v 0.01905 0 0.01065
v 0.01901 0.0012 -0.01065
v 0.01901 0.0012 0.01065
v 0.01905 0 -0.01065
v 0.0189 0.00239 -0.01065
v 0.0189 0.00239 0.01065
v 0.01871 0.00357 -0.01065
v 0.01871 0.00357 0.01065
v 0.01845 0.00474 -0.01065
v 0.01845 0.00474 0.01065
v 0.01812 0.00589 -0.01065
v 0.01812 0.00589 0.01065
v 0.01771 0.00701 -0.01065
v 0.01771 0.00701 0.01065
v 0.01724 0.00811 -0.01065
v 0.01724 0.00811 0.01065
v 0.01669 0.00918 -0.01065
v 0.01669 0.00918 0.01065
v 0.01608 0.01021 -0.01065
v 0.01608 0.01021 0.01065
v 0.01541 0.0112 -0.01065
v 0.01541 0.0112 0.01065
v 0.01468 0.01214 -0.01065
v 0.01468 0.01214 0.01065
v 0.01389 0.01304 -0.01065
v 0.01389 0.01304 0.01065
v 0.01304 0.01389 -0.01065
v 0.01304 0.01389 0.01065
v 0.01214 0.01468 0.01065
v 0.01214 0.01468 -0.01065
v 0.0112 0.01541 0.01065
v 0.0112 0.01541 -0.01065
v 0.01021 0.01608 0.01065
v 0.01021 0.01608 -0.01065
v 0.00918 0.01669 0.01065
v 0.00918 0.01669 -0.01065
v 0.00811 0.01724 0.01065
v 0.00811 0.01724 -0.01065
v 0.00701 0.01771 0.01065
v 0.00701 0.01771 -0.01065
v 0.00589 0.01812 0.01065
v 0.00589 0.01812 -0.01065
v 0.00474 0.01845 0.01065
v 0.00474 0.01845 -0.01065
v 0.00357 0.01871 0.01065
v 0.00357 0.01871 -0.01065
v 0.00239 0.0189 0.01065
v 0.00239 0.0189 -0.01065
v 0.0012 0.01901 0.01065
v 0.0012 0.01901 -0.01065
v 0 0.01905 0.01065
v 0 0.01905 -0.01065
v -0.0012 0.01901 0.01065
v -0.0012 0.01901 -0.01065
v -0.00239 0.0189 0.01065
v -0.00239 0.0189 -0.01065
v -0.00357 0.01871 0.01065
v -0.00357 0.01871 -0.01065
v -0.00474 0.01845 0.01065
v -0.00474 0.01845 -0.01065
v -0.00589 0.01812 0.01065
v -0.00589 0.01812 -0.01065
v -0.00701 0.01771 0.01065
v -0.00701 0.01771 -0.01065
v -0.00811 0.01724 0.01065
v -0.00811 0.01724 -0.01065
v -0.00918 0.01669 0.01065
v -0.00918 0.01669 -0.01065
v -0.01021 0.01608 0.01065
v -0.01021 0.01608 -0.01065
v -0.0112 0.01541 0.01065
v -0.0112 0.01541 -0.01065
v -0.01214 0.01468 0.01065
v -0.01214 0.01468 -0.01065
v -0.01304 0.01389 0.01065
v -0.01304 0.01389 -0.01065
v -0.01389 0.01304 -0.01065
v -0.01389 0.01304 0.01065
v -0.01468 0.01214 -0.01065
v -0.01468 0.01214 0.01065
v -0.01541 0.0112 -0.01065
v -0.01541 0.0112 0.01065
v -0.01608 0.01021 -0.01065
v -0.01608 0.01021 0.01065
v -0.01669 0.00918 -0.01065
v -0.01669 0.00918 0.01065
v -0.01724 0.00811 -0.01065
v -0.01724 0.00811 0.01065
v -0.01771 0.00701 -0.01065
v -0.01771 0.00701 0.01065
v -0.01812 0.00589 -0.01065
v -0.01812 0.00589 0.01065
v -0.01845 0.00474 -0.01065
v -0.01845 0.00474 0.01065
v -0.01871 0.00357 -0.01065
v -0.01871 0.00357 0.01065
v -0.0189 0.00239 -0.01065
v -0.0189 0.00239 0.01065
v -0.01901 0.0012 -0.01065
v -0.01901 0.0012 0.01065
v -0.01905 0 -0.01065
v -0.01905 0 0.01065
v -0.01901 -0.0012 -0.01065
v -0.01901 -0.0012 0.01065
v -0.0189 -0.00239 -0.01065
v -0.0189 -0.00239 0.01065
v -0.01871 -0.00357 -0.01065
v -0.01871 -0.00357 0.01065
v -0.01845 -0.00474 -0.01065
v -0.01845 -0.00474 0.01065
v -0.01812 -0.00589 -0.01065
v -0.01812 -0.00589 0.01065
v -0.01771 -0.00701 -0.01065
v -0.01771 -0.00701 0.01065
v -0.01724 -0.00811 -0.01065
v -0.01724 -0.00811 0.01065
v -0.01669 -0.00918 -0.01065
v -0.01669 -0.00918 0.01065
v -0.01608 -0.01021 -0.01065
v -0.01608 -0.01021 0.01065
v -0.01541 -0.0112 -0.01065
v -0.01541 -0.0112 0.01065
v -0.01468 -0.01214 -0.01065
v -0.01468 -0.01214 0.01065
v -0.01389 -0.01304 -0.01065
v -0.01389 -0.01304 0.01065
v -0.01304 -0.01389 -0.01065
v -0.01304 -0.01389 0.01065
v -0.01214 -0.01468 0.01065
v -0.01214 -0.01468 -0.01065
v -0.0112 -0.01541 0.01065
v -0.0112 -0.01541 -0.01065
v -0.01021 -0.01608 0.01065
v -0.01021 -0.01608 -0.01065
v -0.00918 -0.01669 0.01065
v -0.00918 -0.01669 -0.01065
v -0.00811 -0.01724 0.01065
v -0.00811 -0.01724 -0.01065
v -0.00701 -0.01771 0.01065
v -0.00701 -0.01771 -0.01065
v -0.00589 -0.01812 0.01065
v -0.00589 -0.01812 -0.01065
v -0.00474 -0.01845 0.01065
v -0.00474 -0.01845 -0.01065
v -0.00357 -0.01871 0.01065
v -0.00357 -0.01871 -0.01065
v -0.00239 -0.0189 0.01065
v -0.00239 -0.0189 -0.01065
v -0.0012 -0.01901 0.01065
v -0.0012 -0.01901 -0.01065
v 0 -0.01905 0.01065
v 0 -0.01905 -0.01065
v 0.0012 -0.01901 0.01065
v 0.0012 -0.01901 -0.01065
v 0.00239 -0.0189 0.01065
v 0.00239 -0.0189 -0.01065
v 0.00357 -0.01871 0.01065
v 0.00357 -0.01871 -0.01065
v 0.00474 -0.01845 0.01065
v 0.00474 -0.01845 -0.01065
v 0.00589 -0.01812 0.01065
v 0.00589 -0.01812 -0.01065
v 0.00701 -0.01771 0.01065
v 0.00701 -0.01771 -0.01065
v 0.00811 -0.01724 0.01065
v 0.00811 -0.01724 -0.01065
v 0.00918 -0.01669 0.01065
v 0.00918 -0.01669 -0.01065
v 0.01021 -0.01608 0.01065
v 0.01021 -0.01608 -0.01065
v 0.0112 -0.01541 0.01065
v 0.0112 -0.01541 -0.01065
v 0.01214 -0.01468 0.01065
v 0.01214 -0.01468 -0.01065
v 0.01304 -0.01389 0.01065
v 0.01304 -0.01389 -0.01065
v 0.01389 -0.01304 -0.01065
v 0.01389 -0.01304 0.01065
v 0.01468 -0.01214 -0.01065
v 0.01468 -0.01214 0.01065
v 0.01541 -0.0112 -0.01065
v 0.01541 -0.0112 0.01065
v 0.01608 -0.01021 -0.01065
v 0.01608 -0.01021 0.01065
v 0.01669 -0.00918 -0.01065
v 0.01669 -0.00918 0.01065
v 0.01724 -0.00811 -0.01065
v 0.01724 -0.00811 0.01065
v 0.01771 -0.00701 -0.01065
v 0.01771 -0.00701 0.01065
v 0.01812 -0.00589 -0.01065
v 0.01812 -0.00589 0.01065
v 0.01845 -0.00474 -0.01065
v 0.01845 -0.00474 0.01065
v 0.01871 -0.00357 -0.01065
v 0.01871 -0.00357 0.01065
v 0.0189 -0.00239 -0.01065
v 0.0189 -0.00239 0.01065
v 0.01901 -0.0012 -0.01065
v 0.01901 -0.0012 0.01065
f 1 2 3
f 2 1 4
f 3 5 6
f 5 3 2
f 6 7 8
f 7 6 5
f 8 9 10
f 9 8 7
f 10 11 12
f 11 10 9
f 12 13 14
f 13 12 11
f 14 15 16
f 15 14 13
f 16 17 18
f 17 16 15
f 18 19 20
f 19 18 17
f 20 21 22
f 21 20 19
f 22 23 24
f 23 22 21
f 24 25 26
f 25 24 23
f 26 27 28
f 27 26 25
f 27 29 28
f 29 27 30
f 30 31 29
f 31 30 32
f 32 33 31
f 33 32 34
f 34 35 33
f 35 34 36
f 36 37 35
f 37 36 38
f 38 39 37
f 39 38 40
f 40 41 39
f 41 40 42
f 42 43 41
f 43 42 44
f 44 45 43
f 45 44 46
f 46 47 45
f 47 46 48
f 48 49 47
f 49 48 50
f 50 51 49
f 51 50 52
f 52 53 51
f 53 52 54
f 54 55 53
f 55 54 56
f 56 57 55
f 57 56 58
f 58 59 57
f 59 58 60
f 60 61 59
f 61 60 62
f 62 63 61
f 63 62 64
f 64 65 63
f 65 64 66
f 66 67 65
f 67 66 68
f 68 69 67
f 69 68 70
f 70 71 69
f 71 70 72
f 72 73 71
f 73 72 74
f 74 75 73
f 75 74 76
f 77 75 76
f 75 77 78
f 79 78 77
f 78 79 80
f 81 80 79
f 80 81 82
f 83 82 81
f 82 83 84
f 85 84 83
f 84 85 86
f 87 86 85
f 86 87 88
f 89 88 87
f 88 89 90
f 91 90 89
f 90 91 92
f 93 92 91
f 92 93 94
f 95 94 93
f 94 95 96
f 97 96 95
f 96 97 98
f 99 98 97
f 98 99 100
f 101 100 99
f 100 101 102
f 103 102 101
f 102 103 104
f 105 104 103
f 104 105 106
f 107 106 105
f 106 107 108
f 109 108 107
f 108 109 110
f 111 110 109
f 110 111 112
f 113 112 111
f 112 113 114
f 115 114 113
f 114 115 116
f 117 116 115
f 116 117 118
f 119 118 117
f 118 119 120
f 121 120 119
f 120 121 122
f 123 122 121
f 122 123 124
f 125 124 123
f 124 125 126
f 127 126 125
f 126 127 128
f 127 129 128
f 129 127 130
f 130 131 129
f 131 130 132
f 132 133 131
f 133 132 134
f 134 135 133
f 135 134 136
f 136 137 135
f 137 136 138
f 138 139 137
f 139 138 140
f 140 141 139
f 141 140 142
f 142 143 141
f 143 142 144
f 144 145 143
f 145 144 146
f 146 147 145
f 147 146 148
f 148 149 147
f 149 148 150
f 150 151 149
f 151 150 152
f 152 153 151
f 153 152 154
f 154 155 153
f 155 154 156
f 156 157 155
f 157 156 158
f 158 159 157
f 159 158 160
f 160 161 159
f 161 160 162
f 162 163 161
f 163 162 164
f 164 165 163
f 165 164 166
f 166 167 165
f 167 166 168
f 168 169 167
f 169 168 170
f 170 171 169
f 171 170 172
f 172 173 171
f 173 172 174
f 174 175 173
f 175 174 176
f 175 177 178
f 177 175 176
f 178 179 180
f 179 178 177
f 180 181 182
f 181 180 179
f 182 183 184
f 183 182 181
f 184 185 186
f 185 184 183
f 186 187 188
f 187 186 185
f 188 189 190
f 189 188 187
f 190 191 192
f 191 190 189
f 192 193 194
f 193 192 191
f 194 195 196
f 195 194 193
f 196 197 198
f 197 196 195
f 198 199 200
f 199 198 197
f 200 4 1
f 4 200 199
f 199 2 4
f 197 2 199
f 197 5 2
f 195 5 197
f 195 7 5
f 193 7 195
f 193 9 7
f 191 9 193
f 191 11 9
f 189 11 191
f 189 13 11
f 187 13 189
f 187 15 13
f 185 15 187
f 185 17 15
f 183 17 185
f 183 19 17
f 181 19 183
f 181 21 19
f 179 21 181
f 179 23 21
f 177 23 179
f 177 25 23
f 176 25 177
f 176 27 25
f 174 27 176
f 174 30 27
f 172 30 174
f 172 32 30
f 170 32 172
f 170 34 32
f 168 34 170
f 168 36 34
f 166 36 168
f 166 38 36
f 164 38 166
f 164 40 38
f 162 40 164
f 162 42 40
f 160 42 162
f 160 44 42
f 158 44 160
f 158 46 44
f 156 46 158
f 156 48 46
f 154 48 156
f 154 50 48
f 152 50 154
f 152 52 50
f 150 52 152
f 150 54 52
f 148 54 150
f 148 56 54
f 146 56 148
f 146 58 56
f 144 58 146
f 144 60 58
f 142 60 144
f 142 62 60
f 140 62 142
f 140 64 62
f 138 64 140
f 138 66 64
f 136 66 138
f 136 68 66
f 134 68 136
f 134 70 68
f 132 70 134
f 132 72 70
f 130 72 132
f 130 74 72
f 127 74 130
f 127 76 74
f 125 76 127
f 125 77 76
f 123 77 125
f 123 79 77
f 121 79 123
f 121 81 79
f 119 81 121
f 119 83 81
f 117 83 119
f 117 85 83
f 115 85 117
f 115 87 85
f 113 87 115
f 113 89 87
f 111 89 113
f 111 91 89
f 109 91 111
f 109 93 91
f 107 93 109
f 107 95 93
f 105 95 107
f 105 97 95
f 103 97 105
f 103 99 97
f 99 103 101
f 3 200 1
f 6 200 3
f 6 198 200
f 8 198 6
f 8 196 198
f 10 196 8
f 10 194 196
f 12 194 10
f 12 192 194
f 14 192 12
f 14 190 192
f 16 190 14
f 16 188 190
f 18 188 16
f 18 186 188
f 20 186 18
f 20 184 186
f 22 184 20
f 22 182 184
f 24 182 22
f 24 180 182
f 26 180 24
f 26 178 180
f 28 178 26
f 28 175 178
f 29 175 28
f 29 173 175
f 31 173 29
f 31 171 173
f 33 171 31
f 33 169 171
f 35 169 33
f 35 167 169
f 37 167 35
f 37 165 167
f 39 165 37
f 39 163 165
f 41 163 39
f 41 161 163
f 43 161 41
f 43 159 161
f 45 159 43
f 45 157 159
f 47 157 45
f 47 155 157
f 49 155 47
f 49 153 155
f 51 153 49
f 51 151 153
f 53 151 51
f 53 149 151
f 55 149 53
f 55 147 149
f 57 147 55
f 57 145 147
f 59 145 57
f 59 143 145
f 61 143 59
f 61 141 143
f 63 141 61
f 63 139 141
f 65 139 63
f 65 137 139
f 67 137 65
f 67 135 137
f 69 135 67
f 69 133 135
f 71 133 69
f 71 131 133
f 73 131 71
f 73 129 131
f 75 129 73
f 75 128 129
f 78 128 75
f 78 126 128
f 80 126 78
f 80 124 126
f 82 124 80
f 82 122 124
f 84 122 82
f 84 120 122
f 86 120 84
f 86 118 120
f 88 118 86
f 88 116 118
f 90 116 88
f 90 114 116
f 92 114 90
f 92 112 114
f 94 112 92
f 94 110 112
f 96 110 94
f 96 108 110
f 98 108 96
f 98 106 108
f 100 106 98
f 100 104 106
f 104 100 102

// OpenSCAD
// All units are in meters

include <../openscad2calculix.scad>

// Material properties for acrylic
// Poisson's ratio: https://www.matweb.com/search/DataSheet.aspx?MatGUID=632572aeef2a4224b5ac8fbd4f1b6f77
// Young's modulus: https://www.engineeringtoolbox.com/young-modulus-d_417.html
os2cx_material_elastic_simple(
    "acrylic",
    youngs_modulus=[2.25, "GPa"], /* 1.20 - 3.38 matweb, 1.4 - 3.1 engtoolbox */
    poissons_ratio=0.4, /* 0.37-0.43 */
    density=[1185, "kg/m^3"]); /* 1.185 g/cc */

resolution = 100;

// Stachiw experiments from Figure 7.12 are specified in inches and psi, tdi is t/Di (thickness divided by diameter)
Di = is_undef(inject_diameter) ? 1.5 : inject_diameter;
tdi = is_undef(inject_tdi) ? 0.559 : inject_tdi;
t = tdi * Di;
pressure_psi = is_undef(inject_psi) ? 20000 : inject_psi;

function get_meters_from_inches(inch) = 0.0254 * inch;
Di_meters = get_meters_from_inches(Di);
t_meters = get_meters_from_inches(t);
echo("Di(in)", Di, "t(in)", t, "Di(m)", Di_meters, "t(m)", t_meters, "Di(mm)", Di_meters*1000, "t(mm)", t_meters*1000, "t/Di", tdi);
tolerance = 0.001;
echo("Edge and support tolerance(mm)", tolerance*1000);

// Mesh object in OS2CX
os2cx_mesh("test_disc", material="acrylic") {
    cylinder(d=Di_meters, h=t_meters, $fn=resolution, center=true);
}

// Support the acrylic disc, which is important in getting the right results.
// With supports on the entire cylinder sides, the deflection is micrometers.
// With a thin ring around the bottom edge, the deflection is a more reasonable 1.2mm
// At 6000 psi we are expecting about 0.025"=0.635mm from figure 7.12 but the graph is hard to read
// At 20000 psi fig 7.12 should be 0.15"=3.81mm, the deflection calculated is 4.6mm
os2cx_select_volume("supported_edge") {
    translate([0,0,-t_meters/2])
    difference() {
        cylinder(d=Di_meters+tolerance, h=1*tolerance, $fn=resolution, center=true);
        cylinder(d=Di_meters-tolerance, h=2*tolerance, $fn=resolution, center=true);
    }
}

os2cx_select_surface("load_surface", [0, 0, +1], 45) /* tolerance angle = 45 degrees */ {
    translate([0,0,t_meters/2])
        cylinder(d=Di_meters-tolerance, h=2*tolerance, $fn=resolution, center=true);
}


// Apply pressure across entire load surface in psi
// Convert from psi into Pa since os2cx doesn't support psi or lb/in^2 directly
function get_pascal_from_psi(psi) = 6894.76 * psi;
pressure_Pa = get_pascal_from_psi(pressure_psi);
echo("pressure(psi)", pressure_psi, "pressure(Pa)", pressure_Pa, "pressure(MPa)", pressure_Pa/1000000.0);
os2cx_load_surface(
    "applied_weight",
    "load_surface",
    force_per_area=[[0, 0, -1 * pressure_Pa], "Pa"]);

os2cx_analysis_static_simple(
    fixed="supported_edge",
    load="applied_weight",
    length_unit="m"
);

// Report the maximum deflection of the loaded part
os2cx_measure(
    "max_deflection_result",
    "load_surface",
    "DISP");
